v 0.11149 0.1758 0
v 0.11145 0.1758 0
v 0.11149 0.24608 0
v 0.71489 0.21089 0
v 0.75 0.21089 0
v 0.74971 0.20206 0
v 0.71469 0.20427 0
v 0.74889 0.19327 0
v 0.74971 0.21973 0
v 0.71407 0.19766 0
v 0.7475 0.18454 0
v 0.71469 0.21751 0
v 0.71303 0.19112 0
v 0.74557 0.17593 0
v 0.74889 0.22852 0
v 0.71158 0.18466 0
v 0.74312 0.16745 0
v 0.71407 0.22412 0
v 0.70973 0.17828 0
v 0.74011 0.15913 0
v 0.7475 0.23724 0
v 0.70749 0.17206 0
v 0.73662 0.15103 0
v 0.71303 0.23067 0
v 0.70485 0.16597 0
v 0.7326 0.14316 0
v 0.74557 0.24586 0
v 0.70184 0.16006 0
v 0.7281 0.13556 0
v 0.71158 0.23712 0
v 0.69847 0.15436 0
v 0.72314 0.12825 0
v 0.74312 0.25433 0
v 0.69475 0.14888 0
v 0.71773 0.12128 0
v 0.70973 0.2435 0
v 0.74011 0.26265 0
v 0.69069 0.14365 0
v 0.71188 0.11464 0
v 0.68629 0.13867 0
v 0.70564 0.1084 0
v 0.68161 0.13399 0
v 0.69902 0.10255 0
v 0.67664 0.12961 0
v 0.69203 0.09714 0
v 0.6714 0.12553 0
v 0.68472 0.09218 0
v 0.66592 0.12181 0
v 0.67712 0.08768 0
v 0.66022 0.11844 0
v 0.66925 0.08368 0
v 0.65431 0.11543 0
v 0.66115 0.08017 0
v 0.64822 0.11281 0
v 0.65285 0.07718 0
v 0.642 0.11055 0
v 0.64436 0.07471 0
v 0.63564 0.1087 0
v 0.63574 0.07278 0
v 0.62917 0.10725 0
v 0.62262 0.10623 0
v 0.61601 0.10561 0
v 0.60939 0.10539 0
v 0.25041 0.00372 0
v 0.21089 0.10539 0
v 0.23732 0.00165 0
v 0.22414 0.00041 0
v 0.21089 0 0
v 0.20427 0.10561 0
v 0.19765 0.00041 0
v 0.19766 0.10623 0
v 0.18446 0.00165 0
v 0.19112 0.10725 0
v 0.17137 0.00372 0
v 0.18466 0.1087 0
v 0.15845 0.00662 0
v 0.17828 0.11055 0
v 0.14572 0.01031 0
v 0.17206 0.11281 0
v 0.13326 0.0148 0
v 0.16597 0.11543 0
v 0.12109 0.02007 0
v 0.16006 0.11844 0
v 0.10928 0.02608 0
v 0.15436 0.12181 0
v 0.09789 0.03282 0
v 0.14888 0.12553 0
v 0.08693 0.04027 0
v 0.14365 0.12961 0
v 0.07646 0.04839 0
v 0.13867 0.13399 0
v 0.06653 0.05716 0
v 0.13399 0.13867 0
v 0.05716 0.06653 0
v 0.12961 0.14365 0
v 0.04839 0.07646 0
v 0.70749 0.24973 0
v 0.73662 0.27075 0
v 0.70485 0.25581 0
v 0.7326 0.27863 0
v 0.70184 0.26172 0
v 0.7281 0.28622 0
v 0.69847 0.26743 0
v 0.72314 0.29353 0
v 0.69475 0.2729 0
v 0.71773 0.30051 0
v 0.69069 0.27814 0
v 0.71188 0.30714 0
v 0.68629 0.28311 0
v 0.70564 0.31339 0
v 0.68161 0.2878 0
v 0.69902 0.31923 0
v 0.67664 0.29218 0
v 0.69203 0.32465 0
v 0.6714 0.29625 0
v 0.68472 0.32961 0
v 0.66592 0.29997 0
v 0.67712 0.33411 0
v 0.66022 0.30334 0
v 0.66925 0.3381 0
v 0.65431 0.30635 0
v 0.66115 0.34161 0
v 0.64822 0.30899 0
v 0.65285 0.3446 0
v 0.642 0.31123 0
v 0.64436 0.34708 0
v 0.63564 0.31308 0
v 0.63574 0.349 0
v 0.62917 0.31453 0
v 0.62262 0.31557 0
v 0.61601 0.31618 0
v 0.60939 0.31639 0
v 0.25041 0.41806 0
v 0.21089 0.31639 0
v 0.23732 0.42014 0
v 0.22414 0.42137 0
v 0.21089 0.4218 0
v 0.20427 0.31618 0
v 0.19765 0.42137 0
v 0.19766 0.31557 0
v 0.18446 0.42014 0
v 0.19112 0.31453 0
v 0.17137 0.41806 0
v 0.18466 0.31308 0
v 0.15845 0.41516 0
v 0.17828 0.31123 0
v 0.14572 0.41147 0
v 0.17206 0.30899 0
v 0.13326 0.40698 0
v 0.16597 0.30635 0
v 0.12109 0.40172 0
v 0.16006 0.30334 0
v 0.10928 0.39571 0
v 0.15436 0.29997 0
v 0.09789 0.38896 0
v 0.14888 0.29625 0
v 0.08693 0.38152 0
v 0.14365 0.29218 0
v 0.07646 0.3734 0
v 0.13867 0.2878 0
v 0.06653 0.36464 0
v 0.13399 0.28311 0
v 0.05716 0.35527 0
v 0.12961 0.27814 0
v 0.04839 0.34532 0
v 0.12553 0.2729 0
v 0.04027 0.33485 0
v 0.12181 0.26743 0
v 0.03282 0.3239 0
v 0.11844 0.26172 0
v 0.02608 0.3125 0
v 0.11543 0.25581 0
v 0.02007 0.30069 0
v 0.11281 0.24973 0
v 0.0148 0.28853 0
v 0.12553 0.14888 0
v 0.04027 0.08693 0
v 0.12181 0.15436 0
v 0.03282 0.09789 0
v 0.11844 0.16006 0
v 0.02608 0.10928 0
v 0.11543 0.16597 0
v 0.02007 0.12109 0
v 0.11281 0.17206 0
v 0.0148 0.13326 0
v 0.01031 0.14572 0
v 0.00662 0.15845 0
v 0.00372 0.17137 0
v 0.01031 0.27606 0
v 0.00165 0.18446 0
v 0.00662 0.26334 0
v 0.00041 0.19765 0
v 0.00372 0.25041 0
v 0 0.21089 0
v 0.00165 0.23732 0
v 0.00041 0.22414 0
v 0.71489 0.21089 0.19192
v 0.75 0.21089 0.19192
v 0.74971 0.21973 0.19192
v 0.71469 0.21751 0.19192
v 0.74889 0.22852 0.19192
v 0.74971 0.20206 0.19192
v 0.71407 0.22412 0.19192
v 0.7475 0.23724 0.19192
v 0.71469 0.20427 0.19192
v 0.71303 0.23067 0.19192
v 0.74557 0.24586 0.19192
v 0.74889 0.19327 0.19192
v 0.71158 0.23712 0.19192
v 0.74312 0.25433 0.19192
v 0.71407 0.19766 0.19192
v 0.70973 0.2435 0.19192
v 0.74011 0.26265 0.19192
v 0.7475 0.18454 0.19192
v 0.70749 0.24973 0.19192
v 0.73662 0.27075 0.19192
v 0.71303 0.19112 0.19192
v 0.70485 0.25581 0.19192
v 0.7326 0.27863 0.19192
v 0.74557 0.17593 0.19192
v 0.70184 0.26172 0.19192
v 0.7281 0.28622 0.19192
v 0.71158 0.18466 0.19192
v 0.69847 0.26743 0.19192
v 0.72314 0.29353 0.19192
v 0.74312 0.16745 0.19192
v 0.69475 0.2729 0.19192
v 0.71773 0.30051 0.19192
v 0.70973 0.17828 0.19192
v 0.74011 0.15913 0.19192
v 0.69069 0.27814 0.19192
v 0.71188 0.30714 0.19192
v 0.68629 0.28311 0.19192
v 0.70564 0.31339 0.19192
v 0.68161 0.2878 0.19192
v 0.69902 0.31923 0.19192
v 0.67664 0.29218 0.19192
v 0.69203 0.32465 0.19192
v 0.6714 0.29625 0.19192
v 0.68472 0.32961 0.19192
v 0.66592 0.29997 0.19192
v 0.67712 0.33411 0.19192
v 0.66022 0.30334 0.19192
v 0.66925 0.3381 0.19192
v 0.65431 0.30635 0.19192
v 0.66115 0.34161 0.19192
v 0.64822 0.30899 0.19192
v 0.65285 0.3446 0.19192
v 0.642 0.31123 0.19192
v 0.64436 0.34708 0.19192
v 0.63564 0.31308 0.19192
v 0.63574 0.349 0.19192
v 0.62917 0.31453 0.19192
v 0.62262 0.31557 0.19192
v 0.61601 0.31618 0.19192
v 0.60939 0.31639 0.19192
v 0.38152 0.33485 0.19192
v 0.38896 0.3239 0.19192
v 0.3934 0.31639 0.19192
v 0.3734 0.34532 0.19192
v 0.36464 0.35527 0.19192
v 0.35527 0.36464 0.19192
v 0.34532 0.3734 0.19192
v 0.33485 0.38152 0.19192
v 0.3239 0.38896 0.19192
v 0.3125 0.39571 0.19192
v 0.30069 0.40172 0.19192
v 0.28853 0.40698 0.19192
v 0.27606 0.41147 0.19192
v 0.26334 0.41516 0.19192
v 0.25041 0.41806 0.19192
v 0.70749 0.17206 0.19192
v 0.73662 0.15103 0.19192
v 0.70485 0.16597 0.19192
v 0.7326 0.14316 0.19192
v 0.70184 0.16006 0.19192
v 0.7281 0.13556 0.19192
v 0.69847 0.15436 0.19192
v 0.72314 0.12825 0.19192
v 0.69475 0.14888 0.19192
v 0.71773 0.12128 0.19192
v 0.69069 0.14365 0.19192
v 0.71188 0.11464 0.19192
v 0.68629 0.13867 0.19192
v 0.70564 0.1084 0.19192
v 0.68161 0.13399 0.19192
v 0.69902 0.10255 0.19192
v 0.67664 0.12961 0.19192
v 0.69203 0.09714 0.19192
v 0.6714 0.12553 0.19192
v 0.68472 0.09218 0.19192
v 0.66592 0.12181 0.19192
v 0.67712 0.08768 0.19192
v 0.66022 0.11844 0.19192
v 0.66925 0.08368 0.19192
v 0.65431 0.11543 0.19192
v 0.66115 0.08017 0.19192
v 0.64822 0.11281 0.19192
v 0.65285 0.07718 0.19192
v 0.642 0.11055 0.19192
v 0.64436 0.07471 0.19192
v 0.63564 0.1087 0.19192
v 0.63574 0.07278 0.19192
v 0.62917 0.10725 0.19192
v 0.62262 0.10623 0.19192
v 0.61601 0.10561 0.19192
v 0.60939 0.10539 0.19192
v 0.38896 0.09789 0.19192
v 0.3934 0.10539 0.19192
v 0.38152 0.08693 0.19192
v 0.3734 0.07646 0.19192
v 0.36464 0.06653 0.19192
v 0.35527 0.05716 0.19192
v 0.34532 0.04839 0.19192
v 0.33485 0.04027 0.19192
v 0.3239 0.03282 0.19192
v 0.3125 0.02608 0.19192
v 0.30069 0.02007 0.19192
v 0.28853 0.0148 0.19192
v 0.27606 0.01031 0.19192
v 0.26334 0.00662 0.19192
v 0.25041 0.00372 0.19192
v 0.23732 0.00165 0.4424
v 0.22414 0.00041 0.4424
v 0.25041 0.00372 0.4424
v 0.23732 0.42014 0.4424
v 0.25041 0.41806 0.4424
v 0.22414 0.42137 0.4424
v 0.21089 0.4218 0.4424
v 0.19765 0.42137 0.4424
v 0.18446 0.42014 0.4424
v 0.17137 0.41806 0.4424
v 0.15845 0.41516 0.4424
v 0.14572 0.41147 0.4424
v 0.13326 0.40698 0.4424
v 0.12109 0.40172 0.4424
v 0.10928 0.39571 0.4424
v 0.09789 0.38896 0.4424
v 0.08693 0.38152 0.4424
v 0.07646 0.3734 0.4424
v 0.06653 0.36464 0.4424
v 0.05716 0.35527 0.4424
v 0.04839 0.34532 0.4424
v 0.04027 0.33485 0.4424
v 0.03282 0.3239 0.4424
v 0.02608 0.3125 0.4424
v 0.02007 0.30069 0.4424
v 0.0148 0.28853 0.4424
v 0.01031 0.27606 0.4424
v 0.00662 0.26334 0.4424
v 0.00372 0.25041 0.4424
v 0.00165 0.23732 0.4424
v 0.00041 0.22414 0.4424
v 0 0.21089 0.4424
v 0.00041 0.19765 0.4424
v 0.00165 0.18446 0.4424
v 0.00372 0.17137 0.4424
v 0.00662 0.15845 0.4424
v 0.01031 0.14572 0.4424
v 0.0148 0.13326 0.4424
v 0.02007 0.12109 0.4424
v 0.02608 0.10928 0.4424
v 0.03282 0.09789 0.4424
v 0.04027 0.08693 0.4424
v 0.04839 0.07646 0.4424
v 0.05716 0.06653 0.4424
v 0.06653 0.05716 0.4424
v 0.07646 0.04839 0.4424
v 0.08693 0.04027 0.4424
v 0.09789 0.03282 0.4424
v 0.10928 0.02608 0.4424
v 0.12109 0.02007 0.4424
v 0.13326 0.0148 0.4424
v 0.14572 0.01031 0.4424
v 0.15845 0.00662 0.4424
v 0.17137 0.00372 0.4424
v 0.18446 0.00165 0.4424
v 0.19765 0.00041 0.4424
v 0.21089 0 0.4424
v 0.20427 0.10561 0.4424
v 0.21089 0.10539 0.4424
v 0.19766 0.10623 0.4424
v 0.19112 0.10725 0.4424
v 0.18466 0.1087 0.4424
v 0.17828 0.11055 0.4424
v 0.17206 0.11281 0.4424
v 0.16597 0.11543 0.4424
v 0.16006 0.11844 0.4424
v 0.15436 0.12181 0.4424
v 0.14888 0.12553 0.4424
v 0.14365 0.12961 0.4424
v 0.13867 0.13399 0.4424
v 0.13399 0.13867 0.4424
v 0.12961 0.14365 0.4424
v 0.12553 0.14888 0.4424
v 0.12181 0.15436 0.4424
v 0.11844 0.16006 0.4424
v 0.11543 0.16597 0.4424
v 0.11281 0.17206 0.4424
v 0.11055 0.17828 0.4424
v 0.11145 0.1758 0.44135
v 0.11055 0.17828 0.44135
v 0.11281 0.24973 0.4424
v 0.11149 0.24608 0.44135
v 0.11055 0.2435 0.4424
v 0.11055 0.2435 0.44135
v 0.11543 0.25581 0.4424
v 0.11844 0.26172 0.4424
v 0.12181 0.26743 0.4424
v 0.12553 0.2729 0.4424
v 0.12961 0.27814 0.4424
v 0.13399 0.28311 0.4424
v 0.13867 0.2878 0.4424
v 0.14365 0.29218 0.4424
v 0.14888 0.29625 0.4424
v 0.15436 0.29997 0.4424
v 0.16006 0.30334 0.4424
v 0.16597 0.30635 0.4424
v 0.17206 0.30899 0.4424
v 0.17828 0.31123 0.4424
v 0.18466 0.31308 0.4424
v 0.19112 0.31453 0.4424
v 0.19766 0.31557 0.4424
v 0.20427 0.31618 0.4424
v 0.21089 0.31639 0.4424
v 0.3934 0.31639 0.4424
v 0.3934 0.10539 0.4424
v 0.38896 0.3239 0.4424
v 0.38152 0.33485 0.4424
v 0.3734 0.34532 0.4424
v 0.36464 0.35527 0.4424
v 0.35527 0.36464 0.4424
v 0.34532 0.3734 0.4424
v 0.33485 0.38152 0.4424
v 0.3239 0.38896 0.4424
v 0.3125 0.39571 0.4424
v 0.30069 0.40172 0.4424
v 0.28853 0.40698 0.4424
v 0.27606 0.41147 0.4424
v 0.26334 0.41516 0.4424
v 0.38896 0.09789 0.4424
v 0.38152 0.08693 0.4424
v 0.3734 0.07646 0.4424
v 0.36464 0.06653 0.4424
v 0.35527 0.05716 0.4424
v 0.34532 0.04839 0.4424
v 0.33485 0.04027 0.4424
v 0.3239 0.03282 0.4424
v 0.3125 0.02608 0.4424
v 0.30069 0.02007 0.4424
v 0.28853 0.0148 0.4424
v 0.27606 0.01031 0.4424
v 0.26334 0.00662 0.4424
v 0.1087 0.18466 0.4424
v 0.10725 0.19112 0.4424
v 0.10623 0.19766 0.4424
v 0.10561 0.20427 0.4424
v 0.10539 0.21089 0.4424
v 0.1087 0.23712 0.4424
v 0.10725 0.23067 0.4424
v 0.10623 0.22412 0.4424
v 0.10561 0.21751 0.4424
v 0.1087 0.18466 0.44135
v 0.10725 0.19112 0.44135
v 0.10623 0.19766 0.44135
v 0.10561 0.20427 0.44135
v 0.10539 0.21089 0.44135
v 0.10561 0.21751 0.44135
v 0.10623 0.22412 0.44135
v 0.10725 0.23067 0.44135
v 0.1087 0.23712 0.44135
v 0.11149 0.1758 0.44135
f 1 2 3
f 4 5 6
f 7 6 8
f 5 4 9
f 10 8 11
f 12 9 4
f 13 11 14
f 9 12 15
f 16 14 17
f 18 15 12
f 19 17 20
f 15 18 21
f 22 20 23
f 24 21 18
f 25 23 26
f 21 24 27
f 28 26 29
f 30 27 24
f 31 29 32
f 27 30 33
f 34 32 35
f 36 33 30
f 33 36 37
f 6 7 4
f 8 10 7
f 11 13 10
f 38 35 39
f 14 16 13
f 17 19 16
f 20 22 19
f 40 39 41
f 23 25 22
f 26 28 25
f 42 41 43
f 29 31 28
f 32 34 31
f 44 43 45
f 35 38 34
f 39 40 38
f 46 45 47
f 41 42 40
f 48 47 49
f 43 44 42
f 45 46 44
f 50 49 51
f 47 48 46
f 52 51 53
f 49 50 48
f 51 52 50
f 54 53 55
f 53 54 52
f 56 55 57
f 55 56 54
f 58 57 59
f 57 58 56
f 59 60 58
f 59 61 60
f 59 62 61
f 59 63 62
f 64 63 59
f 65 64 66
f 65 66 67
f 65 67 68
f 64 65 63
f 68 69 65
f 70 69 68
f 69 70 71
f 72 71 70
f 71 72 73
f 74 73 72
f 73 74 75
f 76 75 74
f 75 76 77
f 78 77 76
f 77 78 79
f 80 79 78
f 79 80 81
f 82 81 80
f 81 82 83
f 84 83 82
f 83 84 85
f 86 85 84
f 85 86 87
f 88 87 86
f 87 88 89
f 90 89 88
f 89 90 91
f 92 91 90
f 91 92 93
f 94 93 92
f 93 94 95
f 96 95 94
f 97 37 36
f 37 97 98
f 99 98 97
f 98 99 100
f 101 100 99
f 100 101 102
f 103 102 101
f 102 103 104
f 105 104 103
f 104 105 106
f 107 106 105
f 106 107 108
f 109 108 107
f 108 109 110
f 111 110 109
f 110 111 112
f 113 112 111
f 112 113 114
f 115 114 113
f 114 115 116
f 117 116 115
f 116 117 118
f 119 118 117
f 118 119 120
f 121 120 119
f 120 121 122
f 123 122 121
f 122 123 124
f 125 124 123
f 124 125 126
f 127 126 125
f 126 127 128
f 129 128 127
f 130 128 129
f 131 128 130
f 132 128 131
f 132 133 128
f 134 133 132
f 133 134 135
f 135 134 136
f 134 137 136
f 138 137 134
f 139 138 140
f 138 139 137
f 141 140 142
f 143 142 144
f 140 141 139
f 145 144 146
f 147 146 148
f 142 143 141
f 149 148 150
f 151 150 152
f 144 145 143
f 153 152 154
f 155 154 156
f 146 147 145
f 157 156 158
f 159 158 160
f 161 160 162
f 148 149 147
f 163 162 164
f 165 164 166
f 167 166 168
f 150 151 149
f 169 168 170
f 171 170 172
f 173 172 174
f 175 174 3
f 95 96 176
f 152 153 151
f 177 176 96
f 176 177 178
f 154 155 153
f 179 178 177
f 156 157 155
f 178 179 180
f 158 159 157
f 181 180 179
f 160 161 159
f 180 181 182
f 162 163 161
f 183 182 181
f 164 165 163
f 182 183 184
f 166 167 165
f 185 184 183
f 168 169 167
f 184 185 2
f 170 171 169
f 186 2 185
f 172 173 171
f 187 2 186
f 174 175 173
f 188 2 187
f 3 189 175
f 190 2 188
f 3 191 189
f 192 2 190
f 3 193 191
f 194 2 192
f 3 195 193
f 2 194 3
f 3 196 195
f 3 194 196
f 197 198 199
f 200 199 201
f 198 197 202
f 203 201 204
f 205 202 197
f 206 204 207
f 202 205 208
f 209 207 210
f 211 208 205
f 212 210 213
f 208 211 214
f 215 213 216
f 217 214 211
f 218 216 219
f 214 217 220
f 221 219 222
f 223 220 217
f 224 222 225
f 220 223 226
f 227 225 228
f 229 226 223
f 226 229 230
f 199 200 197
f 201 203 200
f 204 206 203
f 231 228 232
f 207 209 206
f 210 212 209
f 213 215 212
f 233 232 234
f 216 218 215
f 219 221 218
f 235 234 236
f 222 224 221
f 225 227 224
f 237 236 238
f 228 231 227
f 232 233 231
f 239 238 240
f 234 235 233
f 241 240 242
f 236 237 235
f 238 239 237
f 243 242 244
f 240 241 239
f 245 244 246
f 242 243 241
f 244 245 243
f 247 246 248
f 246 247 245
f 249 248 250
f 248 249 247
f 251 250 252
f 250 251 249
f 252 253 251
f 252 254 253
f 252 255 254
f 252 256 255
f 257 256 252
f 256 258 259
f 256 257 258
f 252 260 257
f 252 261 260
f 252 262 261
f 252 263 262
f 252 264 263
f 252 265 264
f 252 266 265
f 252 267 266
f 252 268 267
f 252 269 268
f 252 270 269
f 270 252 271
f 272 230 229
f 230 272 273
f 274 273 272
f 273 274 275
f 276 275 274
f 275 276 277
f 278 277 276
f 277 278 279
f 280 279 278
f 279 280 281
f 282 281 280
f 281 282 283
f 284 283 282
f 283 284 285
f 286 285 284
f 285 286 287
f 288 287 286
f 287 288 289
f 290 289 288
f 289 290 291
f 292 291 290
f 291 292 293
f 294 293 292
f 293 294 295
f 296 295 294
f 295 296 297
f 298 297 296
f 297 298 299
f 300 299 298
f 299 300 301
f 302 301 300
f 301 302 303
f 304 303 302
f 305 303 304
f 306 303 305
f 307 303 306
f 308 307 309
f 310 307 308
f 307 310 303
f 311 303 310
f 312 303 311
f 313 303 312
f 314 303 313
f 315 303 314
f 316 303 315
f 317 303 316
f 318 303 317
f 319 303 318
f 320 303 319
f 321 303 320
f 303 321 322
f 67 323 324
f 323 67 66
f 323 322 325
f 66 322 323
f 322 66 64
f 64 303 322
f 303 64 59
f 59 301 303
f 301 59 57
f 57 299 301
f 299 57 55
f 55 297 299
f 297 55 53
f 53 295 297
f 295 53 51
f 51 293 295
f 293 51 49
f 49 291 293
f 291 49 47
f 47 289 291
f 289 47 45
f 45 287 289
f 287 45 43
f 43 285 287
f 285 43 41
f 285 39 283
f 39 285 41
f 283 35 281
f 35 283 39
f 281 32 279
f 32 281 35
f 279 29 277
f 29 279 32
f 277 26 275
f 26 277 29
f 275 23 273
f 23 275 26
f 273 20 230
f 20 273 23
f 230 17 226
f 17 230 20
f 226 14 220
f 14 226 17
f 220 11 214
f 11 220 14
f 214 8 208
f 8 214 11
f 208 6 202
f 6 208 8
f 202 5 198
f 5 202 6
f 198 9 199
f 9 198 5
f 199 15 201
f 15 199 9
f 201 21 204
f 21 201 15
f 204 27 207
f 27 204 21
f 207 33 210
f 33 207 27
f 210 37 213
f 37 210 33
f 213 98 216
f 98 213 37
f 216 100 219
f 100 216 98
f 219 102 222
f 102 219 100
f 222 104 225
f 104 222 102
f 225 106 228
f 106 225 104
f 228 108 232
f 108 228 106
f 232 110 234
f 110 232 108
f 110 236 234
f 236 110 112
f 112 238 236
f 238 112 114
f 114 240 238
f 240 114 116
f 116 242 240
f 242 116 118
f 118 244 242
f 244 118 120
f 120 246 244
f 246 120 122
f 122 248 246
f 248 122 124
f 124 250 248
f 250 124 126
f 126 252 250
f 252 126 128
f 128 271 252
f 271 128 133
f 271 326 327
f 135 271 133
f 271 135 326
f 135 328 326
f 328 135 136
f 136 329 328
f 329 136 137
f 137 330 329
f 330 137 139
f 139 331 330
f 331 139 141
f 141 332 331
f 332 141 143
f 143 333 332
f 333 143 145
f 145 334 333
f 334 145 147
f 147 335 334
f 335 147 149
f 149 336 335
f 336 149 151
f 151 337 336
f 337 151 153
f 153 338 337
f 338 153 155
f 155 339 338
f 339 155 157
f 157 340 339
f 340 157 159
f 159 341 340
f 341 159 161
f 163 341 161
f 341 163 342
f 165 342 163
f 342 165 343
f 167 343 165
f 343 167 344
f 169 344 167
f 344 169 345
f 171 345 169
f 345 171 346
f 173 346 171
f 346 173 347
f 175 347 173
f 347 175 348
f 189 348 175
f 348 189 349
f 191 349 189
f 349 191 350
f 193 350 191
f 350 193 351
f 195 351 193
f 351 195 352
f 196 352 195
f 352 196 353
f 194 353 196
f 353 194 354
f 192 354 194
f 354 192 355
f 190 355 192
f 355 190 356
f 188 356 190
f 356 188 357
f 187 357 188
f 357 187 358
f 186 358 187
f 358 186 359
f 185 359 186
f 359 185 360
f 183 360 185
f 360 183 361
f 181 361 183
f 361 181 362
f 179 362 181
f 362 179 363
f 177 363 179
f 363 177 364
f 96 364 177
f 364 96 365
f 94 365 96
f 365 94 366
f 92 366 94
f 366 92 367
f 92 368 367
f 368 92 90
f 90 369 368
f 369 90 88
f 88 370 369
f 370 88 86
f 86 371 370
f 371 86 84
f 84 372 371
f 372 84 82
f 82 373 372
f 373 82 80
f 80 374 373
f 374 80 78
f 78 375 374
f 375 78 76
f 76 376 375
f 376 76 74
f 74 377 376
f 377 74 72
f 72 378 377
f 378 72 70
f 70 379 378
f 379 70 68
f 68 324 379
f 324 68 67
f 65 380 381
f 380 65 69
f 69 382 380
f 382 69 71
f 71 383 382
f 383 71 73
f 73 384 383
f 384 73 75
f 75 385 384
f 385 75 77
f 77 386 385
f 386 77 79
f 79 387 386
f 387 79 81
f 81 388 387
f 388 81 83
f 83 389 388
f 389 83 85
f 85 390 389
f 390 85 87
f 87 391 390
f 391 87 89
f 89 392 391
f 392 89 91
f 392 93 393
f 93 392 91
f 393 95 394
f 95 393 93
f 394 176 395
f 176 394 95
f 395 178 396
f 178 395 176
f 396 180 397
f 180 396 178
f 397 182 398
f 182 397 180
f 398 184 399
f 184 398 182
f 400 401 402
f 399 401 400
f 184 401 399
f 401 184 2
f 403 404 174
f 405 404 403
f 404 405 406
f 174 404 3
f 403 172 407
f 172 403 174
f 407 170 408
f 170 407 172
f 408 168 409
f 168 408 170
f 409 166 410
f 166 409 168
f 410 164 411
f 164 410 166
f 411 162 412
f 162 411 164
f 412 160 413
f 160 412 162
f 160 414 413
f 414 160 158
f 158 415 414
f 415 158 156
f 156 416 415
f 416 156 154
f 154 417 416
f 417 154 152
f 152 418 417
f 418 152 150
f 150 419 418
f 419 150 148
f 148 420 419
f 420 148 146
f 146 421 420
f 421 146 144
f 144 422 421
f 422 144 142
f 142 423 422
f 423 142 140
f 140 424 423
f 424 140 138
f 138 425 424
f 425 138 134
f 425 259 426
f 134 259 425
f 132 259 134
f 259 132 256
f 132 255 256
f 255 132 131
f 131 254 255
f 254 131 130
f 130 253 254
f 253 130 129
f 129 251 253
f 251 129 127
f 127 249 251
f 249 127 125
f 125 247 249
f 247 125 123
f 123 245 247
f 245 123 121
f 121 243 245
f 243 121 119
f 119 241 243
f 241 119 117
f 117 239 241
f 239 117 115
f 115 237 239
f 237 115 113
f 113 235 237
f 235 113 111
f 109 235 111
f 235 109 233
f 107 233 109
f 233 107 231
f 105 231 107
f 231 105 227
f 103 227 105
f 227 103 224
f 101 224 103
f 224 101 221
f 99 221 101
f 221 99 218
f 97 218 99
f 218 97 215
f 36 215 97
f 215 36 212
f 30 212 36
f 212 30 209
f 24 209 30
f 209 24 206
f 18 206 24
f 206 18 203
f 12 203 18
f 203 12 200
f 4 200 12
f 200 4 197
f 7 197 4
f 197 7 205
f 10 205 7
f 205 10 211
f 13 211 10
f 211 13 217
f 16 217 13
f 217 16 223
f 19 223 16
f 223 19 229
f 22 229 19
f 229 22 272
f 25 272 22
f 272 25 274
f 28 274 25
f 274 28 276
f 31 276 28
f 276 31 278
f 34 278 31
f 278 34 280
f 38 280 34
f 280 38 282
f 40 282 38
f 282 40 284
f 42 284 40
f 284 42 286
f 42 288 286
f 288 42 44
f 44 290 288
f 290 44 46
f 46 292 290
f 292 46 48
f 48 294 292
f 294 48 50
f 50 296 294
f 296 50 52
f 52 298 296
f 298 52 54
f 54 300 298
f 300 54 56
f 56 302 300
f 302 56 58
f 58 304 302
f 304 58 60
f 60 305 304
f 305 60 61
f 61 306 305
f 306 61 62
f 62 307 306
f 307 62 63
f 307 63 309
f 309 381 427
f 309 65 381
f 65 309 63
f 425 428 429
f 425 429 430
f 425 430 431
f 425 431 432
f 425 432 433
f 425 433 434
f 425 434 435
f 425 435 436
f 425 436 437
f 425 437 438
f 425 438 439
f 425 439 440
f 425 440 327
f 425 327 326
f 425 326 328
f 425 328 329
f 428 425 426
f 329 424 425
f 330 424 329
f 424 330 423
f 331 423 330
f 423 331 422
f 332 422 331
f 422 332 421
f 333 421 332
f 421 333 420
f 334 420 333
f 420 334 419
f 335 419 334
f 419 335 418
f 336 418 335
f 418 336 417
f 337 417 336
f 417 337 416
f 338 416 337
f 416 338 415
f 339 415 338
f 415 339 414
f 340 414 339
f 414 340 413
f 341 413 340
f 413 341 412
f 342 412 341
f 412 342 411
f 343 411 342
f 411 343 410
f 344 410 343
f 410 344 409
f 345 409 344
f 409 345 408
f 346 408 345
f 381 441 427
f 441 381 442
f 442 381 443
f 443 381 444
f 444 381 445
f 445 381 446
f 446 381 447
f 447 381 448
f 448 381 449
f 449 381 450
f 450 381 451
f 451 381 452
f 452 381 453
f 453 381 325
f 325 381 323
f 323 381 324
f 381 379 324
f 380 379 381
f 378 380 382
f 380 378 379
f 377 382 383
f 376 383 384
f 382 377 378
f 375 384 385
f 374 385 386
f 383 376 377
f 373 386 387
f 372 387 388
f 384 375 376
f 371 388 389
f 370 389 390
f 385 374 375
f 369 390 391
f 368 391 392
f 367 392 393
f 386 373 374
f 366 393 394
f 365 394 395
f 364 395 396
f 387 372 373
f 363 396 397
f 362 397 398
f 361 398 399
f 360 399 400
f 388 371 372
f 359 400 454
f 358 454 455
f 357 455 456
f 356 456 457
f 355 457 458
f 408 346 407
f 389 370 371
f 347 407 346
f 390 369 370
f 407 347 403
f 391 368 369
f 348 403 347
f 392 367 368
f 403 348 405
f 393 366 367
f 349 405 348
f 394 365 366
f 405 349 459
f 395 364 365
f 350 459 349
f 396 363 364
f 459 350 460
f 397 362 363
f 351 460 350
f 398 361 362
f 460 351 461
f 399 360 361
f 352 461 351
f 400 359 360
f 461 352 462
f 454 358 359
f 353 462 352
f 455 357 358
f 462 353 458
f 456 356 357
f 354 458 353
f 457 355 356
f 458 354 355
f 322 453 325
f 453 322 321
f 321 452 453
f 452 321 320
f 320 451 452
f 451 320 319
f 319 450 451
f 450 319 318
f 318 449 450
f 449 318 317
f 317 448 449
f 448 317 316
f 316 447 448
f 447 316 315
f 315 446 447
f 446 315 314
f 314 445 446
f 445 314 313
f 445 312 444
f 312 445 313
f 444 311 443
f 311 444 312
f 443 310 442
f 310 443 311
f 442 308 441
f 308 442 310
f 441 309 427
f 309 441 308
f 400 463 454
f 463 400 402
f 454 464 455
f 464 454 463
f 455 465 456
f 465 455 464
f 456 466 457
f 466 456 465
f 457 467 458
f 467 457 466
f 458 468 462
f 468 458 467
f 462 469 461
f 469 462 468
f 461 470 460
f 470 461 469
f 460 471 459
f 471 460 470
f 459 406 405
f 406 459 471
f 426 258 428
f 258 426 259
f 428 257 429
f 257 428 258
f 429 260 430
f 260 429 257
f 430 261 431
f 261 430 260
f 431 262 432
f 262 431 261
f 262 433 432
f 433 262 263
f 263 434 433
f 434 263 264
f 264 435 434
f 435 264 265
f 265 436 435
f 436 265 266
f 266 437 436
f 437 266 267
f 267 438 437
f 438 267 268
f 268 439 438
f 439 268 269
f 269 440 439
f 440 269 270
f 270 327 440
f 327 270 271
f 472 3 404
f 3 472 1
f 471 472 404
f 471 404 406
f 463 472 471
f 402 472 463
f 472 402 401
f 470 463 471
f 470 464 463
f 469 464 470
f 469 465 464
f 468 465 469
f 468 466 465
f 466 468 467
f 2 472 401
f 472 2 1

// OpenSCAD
// Parametric CAD model
// Based on specified dimensions and geometry

// Parameters
$fn = 100;  // Smooth curved surfaces

// Base plate overall span
span_length = 0.75;
span_width  = 0.421875;
base_height = 0.191921;  // Lower base extrusion height from datum

// Left circular profile (axis and radius)
left_axis_x = 0.2109;
left_axis_y = 0.2109;
left_radius = 0.2109;

// Right circular concentric group
right_axis_x = 0.6094;
right_axis_y = 0.2109;
right_outer_radius = 0.1406;
right_inner_radius = 0.1055;   // opening radius

// Assumed inner hole radius for left circle (same as right inner)
inner_hole_radius = 0.1055;

// Taller upper circular section (left boss)
upper_section_height = 0.4424;   // from base datum

// Rectangular upright tab
tab_length = 0.041188;
tab_width  = 0.070313;
tab_height = 0.441346;           // from base datum
tab_left_offset  = 0.0703;       // x position
tab_front_offset = 0.1758;       // y position

// ---- 2D Profiles (used as cross sections) ----

// Outer shape of the lower base: hull of left solid circle and right outer circle
module outer_base_profile() {
    hull() {
        translate([left_axis_x, left_axis_y])
            circle(r = left_radius);
        translate([right_axis_x, right_axis_y])
            circle(r = right_outer_radius);
    }
}

// Inner cutout (combined slot and holes): hull of the two inner circles
module inner_cutout() {
    hull() {
        translate([left_axis_x, left_axis_y])
            circle(r = inner_hole_radius);
        translate([right_axis_x, right_axis_y])
            circle(r = inner_hole_radius);
    }
}

// ---- Solid components ----

// Lower base plate (extruded from 0 to base_height)
module lower_base() {
    linear_extrude(height = base_height)
    difference() {
        outer_base_profile();
        inner_cutout();
    }
}

// Upper circular boss (left side, taller)
module upper_circular_section() {
    linear_extrude(height = upper_section_height)
    difference() {
        // Outer circle of the left boss
        translate([left_axis_x, left_axis_y])
            circle(r = left_radius);
        inner_cutout();   // subtract the slot + holes (opens the right side)
    }
}

// Rectangular tab
module upright_tab() {
    translate([tab_left_offset, tab_front_offset, 0])
        cube([tab_length, tab_width, tab_height]);
}

// ---- Main assembly: union all components ----
union() {
    lower_base();
    upper_circular_section();
    upright_tab();
}
